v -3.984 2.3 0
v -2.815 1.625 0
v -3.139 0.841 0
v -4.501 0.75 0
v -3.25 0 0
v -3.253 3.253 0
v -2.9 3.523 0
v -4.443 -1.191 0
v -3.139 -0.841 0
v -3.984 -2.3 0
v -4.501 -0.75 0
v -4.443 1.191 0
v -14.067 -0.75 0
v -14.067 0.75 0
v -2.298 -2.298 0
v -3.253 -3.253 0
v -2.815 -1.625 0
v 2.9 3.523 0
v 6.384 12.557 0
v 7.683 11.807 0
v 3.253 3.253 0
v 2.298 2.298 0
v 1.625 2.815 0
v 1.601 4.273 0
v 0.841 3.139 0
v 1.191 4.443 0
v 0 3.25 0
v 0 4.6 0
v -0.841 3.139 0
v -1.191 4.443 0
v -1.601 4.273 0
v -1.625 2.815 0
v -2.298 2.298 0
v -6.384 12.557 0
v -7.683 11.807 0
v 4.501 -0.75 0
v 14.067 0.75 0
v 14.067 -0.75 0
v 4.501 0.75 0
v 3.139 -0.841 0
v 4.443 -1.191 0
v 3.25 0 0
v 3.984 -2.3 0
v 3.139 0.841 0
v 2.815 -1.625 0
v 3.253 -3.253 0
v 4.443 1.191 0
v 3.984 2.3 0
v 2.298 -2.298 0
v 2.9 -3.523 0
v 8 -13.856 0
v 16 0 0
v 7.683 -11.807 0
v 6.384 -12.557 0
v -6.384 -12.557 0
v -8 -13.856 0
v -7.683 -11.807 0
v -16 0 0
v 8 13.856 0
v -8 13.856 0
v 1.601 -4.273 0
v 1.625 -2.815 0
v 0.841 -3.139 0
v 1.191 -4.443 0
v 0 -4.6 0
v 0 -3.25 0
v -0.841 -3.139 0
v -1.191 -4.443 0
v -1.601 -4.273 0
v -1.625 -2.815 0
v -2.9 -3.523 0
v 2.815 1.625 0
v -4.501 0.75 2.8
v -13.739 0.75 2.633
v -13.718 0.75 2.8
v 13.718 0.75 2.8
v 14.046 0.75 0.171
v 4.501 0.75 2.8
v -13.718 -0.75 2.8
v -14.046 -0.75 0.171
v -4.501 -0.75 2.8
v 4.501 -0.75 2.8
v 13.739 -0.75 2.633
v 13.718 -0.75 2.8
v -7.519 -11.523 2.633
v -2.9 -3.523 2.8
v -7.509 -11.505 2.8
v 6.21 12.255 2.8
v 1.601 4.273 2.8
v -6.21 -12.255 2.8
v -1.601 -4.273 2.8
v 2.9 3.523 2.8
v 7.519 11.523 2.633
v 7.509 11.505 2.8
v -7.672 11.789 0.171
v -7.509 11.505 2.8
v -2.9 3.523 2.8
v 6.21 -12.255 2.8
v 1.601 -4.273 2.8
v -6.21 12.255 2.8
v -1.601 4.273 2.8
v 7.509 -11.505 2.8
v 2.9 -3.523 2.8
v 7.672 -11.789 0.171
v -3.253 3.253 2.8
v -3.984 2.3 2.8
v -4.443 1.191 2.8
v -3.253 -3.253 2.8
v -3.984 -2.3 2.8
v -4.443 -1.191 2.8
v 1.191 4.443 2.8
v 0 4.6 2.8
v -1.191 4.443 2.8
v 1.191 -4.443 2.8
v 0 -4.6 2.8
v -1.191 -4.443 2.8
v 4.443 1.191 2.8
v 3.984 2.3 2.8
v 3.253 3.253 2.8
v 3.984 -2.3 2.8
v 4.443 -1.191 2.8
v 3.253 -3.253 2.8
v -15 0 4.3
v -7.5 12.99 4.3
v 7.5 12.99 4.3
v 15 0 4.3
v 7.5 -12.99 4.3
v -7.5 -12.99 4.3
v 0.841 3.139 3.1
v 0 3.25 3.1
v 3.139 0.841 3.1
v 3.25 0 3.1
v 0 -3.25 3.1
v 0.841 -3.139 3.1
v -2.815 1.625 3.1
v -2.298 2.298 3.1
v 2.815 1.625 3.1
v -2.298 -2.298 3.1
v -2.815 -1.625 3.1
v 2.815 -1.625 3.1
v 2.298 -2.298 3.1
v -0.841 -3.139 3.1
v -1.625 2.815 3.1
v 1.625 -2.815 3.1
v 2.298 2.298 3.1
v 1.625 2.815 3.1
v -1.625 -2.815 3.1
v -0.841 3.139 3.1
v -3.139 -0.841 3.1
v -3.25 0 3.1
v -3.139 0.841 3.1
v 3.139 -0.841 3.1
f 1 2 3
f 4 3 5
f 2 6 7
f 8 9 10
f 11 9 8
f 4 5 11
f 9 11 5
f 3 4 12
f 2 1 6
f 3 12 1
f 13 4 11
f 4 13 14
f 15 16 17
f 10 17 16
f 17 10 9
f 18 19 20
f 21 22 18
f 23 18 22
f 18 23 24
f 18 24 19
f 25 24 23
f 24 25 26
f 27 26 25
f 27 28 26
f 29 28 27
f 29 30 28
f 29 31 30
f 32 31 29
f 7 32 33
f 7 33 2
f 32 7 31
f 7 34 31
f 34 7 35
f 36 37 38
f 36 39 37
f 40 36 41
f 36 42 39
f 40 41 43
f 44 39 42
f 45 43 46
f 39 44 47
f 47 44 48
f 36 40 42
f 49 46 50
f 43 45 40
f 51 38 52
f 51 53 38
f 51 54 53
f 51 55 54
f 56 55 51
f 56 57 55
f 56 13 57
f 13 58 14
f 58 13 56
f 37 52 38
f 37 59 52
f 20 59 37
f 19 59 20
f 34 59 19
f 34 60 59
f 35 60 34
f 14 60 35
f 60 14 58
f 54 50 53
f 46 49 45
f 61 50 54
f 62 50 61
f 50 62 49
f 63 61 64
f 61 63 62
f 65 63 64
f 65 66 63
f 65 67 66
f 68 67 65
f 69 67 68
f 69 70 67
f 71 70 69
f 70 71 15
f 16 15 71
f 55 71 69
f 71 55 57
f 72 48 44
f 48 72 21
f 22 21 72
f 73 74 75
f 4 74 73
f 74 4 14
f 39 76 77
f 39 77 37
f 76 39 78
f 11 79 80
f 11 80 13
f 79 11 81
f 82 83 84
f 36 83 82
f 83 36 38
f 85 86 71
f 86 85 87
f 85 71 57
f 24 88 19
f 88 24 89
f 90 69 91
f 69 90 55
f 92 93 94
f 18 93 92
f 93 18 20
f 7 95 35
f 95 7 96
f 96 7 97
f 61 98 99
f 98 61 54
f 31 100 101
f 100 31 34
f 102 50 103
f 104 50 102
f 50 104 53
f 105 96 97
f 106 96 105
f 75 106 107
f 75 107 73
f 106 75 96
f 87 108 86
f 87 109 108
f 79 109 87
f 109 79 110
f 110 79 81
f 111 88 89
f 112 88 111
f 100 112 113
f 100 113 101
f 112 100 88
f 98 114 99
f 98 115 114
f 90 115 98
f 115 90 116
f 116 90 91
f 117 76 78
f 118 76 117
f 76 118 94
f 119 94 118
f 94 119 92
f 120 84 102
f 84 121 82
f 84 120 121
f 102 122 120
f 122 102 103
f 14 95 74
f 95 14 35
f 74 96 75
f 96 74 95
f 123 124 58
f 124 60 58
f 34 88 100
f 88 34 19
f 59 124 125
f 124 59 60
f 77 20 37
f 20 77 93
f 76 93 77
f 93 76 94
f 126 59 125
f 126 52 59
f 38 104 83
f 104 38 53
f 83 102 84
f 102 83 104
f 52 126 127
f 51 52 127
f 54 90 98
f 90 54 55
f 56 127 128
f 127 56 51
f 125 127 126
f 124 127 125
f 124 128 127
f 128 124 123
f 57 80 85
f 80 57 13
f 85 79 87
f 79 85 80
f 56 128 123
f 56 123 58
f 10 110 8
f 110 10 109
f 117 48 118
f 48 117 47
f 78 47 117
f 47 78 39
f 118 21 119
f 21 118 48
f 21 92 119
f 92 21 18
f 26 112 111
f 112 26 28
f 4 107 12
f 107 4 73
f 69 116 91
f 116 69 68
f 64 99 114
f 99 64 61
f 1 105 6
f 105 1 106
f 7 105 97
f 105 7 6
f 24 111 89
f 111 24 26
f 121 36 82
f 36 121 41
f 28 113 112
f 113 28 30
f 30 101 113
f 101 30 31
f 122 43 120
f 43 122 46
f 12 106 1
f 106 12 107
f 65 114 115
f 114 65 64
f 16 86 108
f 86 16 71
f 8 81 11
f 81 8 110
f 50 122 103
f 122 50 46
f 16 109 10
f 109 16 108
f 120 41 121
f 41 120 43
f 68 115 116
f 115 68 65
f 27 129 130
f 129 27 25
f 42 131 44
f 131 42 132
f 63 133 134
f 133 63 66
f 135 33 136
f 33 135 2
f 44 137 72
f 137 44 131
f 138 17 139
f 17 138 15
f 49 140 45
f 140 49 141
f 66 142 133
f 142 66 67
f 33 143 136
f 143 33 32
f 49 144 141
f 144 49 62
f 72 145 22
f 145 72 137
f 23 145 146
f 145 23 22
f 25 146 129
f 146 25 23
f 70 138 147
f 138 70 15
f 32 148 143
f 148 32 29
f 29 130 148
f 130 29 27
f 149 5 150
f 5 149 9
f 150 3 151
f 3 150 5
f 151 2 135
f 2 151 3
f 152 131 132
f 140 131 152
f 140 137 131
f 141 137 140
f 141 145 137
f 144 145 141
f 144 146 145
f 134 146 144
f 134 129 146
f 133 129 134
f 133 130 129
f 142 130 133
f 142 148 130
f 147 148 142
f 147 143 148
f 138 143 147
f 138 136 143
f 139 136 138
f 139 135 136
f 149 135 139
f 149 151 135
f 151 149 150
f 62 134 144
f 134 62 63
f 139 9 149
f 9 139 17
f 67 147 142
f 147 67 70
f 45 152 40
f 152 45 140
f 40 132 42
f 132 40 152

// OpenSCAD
// file: ../../girl/girl_common.scad
// Copyright 2025 Natalie Baker // Apache v2 //

base_size  = 32;
wall_width =  9;

magnet_dia    = 6.2;
magnet_height = 2.8;

lock_height   = 1.9;
lock_depth    = 4.9;
lock_shoulder = 2.0;
lock_width    = 11;

grid_size   = base_size + 2*wall_width;
grid_diag   = sqrt(2*grid_size*grid_size);
grid_height = max(lock_height, magnet_height)+1.2;

frame_size = 2.4;

module mirror_copy(m) {
	mirror(m) children();
	children();	
}

module repeat(size, x, y, z, center) {
	off = center 
		? [(x-1)*size[0],(y-1)*size[1],(z-1)*size[2]]/2 
		: [0,0,0];

	for(i = [0 : x-1])
	for(j = [0 : y-1])
	for(k = [0 : z-1])
		translate([
			size[0]*i-off[0],
			size[1]*j-off[1],
			size[2]*k-off[2]
		]) children();
}
// file: ../../girl/girl_base.scad
// Copyright 2025 Natalie Baker // Apache v2 //

include<girl_common.scad>;

base_thickness = 1.5;
base_gap       = magnet_height;

base_rad      = base_size/2;
base_rad_top  = (base_size - 2)/2;
base_rad_in   = base_rad_top+(base_rad-base_rad_top)*(base_gap/(base_thickness+base_gap));
 
girl_base();

module girl_base() {
	$fn=24;
	difference() {
		union() {
			_girl_base_part();
			cylinder(d=magnet_dia+2*base_thickness, h=base_gap);
			
			for(i = [0:2])
			rotate(60*i)
			linear_extrude(base_gap)
			square([base_size-1.45*base_thickness,base_thickness], center=true);
		}
		
		_girl_base_magnet_hole();
	}
}

module _girl_base_part() {
	rotate_extrude($fn=6)
	intersection() {
		polygon([ 
			[                  base_rad,                       0],
			[              base_rad_top, base_thickness+base_gap],
			[                        -1, base_thickness+base_gap],
			[                        -1,                base_gap],
			[base_rad_in-base_thickness,                base_gap],
			[base_rad   -base_thickness,                       0],
		]);
		square([base_rad, base_thickness+base_gap]);
	}
}

module _girl_base_magnet_hole(tolerance=0.15) {
	mad_d = magnet_dia+2*tolerance;
	mag_h = magnet_height+2*tolerance;
	
	translate([0,0,-0.05])
	cylinder(d=mad_d, h=mag_h+0.05);
}
// main file
// Copyright 2025 Natalie Baker // Apache v2 //

use<../../girl/girl_base.scad>;

girl_base();
